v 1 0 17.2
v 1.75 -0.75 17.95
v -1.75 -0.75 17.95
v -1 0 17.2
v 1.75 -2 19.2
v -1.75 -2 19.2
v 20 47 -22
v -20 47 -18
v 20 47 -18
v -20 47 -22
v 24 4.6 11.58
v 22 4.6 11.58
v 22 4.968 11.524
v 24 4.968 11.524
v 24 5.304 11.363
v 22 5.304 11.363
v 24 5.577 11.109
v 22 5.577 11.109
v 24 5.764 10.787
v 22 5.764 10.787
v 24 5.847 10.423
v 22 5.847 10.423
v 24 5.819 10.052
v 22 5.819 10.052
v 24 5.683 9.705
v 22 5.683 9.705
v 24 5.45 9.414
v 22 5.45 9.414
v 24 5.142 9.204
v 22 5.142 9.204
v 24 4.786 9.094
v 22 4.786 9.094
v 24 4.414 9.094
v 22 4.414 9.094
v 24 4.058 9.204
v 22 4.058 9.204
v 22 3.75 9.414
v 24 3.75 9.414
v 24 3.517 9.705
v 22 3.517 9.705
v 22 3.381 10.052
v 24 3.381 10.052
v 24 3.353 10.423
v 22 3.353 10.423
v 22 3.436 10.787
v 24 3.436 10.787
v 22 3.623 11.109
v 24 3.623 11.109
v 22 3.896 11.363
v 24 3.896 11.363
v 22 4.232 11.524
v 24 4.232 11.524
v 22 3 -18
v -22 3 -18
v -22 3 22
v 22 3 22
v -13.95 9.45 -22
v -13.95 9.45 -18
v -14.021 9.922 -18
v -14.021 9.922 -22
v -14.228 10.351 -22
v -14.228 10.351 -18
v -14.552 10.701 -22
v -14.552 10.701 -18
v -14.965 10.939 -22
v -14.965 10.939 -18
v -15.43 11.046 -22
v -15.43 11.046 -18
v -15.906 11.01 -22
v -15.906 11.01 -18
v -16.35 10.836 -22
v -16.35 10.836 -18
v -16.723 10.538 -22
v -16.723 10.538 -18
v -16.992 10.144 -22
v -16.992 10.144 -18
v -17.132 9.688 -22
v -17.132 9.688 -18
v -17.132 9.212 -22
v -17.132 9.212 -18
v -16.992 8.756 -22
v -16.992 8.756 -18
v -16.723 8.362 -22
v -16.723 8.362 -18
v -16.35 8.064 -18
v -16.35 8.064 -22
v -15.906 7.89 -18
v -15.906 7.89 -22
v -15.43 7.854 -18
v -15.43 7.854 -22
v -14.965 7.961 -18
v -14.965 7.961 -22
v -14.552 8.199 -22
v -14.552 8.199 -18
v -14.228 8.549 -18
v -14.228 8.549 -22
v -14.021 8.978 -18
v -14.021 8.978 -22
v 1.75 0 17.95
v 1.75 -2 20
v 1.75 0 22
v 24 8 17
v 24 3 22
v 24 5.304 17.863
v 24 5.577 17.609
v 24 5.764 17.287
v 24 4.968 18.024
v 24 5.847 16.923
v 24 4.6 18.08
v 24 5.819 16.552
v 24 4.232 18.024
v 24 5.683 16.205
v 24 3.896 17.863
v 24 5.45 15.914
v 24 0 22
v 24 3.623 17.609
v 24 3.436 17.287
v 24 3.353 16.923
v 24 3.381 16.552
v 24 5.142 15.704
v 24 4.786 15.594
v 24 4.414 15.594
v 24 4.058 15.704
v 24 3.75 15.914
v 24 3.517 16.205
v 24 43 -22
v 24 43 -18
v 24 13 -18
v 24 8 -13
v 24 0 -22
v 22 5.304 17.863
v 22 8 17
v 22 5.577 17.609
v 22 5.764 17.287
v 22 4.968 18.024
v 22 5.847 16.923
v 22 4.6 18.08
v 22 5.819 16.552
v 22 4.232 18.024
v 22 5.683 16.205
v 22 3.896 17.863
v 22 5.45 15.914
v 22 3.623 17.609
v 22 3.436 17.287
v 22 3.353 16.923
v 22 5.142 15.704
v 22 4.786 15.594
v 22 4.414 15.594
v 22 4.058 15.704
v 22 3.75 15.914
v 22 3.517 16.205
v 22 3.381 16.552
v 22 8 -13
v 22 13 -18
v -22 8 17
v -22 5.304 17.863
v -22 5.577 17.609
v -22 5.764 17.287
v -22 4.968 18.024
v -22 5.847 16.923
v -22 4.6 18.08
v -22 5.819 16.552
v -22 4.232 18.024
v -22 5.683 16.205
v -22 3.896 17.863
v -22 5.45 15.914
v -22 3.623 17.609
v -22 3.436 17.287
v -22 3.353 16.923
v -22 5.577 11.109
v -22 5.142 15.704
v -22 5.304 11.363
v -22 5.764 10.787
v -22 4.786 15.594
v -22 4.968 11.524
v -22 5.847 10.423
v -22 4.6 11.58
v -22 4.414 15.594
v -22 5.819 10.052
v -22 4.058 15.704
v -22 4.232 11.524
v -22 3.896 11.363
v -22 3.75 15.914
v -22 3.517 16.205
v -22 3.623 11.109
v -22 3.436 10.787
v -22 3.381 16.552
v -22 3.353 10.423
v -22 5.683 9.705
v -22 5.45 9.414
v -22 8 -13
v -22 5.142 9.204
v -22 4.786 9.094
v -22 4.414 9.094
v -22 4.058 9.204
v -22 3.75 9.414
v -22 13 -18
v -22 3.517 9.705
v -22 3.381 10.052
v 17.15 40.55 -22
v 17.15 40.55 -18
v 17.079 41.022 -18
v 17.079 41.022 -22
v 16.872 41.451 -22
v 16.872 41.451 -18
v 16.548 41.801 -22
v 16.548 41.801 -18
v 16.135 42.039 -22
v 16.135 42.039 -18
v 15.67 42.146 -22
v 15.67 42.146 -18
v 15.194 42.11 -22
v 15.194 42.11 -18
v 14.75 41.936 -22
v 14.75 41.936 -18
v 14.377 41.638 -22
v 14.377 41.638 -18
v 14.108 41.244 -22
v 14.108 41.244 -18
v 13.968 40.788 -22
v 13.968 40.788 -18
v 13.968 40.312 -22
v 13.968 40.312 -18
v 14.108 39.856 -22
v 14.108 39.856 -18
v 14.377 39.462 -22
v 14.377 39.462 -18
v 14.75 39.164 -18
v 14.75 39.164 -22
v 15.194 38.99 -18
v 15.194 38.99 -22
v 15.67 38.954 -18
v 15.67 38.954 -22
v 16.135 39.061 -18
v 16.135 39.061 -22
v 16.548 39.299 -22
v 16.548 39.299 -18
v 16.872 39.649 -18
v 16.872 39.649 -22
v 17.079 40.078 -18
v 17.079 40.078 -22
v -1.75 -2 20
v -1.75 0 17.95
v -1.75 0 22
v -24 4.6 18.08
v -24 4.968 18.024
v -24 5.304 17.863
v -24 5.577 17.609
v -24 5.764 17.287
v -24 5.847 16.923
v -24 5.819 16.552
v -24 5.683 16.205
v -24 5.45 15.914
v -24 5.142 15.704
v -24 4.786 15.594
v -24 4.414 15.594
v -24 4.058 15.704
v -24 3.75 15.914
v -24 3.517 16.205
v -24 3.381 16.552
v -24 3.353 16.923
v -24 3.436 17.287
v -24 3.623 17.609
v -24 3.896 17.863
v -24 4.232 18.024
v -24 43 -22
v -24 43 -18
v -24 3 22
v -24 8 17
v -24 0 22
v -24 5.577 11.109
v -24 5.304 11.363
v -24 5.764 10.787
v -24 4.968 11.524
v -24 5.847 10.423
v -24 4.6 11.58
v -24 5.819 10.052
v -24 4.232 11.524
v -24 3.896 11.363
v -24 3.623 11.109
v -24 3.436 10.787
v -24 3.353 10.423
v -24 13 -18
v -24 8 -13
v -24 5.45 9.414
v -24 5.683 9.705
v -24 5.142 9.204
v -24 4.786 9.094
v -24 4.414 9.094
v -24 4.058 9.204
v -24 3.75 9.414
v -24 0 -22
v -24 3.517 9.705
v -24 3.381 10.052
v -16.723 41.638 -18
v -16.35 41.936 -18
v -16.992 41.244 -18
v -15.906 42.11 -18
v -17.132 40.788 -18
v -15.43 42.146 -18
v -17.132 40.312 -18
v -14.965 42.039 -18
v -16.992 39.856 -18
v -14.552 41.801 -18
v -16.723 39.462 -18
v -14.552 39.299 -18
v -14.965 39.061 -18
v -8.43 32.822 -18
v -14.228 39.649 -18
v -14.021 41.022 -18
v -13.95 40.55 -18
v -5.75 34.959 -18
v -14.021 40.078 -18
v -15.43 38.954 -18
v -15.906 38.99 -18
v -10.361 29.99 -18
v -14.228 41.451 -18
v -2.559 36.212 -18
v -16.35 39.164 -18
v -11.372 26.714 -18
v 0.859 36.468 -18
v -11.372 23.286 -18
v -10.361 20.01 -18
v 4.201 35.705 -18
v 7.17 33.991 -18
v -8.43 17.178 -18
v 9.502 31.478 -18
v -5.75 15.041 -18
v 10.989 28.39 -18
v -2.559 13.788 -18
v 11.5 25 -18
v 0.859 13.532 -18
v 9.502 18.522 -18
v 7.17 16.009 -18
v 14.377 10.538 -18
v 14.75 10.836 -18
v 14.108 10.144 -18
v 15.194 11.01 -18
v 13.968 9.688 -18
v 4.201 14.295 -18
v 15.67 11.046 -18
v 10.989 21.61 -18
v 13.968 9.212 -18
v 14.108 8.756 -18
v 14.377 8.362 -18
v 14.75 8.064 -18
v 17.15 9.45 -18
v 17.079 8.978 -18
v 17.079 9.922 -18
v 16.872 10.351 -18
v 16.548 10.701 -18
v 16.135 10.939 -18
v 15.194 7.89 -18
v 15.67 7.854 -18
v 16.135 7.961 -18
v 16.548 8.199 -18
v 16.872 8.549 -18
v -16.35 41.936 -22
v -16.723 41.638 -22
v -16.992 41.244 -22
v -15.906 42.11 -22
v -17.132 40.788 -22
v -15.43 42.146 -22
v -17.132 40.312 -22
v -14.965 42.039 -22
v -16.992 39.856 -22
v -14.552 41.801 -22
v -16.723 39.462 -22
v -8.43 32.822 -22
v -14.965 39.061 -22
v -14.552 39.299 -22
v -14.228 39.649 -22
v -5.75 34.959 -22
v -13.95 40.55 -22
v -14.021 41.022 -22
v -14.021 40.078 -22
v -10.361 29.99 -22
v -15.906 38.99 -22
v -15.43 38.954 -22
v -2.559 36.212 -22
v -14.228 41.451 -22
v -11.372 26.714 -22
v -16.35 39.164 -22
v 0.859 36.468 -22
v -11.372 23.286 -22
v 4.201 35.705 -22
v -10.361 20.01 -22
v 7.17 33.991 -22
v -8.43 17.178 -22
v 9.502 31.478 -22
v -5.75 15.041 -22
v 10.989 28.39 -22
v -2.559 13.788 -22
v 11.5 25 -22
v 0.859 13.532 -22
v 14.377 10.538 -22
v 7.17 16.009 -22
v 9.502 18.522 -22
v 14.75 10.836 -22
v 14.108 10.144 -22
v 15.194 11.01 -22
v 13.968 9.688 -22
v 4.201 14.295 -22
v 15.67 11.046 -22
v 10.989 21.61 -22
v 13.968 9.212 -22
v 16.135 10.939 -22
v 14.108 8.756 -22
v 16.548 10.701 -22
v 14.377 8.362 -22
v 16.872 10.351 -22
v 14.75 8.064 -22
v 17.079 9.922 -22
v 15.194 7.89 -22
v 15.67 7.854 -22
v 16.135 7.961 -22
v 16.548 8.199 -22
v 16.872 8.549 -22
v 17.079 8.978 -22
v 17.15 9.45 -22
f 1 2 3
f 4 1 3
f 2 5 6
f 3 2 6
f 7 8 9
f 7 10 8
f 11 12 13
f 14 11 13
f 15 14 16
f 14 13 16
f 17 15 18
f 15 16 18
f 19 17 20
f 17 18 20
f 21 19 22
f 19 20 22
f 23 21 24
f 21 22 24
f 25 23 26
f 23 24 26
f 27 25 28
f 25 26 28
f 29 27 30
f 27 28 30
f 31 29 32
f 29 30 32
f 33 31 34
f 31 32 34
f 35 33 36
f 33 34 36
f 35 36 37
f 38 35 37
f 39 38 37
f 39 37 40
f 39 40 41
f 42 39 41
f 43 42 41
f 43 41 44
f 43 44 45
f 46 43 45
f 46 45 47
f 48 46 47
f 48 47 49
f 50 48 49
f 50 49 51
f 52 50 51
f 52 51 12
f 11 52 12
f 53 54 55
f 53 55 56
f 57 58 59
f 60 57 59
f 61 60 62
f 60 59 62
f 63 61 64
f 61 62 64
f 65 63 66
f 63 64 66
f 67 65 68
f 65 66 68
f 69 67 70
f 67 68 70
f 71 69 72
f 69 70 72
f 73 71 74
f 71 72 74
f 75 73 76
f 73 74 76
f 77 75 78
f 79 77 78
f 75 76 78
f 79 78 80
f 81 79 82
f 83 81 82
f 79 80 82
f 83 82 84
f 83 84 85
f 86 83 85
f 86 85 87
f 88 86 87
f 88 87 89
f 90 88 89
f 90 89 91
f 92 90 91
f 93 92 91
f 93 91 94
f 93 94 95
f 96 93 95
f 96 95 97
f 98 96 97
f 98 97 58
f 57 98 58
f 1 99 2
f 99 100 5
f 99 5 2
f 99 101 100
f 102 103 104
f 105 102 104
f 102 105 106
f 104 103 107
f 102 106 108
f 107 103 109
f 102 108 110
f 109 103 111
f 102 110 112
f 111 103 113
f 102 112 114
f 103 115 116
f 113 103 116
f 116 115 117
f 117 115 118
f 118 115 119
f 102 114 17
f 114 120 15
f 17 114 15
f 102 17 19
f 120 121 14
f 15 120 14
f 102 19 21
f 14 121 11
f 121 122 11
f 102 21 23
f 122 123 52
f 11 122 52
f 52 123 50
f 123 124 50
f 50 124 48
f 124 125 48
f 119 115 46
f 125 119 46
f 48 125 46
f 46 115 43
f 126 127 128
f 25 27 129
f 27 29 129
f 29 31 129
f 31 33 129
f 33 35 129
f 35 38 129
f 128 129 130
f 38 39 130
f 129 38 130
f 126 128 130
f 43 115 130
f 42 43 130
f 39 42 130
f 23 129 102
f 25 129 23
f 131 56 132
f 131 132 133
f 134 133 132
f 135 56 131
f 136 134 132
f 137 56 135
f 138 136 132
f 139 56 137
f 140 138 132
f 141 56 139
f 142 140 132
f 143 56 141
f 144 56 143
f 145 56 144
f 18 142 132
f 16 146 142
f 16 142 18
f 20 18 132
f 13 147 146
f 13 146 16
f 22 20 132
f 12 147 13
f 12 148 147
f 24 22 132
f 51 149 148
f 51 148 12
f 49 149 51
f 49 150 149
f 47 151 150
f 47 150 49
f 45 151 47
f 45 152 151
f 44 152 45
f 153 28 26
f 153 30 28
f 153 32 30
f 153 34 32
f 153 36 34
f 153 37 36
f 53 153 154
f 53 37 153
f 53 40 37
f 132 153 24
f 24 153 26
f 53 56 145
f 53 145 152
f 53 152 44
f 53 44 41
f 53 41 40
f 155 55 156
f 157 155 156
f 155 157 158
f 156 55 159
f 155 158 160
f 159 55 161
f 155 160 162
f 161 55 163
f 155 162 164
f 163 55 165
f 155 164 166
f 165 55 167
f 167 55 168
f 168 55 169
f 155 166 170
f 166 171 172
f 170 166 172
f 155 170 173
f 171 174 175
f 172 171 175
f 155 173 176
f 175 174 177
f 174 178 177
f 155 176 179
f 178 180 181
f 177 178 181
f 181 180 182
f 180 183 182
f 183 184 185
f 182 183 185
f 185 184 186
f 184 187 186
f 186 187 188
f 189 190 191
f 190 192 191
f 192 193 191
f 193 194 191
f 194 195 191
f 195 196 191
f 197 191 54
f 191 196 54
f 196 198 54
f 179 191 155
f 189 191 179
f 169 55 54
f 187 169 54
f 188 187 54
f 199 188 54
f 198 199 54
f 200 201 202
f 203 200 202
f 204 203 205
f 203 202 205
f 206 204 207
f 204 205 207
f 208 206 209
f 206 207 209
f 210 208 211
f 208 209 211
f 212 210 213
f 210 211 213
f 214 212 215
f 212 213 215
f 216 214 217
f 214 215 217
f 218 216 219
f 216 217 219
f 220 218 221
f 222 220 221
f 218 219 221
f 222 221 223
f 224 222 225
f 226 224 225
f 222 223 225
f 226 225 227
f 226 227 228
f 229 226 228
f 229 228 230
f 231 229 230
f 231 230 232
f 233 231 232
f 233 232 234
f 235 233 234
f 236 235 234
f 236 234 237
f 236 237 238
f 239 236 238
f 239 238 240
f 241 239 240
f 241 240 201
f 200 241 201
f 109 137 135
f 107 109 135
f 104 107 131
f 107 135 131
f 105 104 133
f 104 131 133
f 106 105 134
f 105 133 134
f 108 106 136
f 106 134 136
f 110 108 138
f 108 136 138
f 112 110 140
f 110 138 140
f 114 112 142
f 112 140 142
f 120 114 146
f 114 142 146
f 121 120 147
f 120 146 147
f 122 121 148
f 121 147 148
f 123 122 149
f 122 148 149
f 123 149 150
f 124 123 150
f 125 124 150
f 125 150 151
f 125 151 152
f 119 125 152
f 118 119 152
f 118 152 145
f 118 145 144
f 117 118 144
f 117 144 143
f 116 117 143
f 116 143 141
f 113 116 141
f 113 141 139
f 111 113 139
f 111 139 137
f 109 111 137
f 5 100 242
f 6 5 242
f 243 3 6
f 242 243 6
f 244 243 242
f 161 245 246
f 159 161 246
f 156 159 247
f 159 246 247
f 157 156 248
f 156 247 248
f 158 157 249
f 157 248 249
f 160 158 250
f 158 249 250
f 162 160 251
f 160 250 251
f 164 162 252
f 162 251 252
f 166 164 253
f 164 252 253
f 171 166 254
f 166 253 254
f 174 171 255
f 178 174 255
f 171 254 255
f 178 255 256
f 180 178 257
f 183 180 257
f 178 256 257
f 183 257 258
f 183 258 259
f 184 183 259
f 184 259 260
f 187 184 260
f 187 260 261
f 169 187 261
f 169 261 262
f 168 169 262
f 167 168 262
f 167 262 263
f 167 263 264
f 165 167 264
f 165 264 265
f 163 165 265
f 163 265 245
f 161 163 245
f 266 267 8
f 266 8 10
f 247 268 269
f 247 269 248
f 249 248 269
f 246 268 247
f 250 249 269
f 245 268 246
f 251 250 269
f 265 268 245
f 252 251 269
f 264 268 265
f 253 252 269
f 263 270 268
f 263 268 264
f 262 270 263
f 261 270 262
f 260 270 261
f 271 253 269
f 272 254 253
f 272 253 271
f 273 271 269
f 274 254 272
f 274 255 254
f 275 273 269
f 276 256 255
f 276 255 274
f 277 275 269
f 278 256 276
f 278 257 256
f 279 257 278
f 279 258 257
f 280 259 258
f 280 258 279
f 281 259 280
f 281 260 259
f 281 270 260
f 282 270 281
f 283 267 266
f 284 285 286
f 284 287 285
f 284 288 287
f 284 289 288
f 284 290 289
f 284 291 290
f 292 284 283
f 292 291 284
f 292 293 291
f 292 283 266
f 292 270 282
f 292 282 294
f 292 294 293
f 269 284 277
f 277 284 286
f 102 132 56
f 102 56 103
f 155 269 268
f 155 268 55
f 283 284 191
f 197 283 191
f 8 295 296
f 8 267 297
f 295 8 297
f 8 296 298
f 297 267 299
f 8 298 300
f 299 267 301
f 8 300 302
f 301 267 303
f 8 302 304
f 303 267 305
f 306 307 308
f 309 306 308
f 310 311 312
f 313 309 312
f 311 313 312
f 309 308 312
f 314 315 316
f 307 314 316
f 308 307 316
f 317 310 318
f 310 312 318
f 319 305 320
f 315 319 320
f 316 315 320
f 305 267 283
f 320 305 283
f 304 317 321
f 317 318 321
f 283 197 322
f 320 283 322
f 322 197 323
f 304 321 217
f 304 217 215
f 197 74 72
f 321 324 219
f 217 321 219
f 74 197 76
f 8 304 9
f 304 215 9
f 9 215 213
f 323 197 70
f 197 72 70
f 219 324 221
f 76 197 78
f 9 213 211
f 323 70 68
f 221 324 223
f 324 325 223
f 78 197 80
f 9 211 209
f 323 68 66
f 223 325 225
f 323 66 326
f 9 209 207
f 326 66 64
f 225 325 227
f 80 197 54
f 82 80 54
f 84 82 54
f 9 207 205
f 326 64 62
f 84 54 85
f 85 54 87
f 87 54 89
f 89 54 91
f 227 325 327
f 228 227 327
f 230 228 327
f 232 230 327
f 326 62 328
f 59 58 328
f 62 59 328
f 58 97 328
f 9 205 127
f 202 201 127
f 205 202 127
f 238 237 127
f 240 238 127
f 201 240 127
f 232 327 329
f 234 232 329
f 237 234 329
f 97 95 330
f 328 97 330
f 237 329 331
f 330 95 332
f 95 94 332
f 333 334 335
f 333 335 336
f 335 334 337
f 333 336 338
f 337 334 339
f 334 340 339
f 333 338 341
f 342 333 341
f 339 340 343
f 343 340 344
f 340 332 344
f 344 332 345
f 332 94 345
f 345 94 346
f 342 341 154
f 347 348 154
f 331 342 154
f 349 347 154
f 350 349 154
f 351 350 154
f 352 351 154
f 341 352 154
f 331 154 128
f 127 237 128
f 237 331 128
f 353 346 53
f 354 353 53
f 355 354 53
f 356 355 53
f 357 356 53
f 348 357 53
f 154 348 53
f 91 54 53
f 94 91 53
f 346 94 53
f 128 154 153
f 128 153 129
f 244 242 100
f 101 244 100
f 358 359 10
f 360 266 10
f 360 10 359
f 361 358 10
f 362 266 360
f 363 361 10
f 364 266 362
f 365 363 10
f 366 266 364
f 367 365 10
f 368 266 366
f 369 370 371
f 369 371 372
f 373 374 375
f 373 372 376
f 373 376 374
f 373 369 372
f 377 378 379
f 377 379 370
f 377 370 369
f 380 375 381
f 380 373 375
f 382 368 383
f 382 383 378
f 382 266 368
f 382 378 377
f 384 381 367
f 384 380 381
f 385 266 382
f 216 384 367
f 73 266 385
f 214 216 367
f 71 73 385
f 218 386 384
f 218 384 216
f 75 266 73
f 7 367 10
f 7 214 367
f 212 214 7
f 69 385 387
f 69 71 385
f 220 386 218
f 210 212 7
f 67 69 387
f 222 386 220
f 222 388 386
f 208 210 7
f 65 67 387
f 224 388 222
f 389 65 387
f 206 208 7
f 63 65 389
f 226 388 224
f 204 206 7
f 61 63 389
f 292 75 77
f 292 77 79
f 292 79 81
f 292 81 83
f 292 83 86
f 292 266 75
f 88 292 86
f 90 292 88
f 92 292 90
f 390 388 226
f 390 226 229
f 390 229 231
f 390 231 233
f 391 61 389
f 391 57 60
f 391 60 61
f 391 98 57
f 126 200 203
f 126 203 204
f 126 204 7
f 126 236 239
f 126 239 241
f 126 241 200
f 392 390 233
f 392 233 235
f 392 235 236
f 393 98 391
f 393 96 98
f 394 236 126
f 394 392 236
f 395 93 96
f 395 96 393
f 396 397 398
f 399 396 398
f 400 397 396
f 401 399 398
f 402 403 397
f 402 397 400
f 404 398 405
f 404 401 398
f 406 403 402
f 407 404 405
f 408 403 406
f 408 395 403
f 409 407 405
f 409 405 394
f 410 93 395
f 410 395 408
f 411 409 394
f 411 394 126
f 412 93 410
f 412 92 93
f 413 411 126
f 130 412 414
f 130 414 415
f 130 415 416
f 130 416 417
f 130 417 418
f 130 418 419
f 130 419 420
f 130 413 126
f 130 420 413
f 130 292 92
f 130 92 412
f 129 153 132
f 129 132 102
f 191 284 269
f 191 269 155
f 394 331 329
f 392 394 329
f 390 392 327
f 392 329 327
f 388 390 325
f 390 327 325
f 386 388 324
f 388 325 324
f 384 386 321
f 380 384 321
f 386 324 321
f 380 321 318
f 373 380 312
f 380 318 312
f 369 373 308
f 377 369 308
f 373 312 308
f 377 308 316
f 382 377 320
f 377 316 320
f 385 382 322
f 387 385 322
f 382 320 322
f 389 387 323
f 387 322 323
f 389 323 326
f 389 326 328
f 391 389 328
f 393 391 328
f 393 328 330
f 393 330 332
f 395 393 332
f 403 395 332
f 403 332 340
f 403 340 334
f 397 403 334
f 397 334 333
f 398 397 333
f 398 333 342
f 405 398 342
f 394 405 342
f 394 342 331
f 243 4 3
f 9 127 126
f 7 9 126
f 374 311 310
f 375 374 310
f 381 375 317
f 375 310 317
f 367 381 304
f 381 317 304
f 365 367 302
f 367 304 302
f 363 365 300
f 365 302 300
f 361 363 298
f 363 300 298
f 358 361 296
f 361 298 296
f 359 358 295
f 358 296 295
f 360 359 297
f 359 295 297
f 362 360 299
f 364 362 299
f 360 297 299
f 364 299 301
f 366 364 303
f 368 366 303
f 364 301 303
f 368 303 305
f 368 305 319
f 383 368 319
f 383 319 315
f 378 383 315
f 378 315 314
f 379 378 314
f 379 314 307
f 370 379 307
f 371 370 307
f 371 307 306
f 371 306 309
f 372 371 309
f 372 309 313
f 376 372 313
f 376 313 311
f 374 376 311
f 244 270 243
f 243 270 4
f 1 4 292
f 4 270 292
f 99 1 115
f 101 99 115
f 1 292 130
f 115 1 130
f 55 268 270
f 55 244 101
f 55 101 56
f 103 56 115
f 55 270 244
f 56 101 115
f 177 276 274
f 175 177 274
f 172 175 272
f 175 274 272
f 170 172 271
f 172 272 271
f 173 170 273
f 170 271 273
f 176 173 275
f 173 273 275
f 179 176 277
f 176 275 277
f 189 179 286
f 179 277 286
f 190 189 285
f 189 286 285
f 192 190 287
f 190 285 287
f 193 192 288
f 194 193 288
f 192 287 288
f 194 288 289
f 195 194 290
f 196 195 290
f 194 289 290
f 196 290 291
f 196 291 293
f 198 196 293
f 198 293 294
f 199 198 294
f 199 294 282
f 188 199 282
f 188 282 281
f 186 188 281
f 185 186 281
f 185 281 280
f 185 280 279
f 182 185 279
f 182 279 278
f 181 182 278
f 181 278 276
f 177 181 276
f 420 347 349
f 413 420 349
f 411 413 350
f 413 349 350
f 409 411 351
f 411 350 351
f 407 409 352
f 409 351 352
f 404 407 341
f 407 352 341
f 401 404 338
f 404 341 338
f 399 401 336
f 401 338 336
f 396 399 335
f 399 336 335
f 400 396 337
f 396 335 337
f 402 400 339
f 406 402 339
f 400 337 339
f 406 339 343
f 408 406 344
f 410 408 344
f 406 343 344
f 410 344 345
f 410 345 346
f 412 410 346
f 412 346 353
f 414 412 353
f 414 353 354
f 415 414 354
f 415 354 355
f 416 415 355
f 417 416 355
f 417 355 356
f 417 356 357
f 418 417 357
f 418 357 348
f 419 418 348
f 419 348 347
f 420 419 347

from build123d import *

# Parameters (mm, degrees)
SKIZZE1_W                       = 48
SKIZZE1_H                       = 44
AUFSATZ_LINEAR_AUSTRAGEN1_DEPTH = 3
SKIZZE2_W                       = 48
SKIZZE2_H                       = 4
AUFSATZ_LINEAR_AUSTRAGEN2_DEPTH = 44
SKIZZE3_R                       = 11.5
SKIZZE3_R_2                     = 1.6
SCHNITT_LINEAR_AUSTRAGEN1_DEPTH = 67.219332525
SKIZZE5_W                       = 2
SKIZZE5_H                       = 40
AUFSATZ_LINEAR_AUSTRAGEN3_DEPTH = 5
FASE2_SIZE                      = 5
FASE3_SIZE                      = 4
AUFSATZ_LINEAR_AUSTRAGEN4_DEPTH = 2
FASE4_SIZE                      = 2
SKIZZE8_R                       = 1.25
SCHNITT_LINEAR_AUSTRAGEN2_DEPTH = 71.689461732


with BuildPart() as part:
    # Skizze1 → Aufsatz-Linear austragen1 (new body)
    with BuildSketch(Plane(origin=(0, 0, 0), x_dir=(1, 0, 0), z_dir=(0, 1, 0))):
        Rectangle(SKIZZE1_W, SKIZZE1_H)
    extrude(amount=AUFSATZ_LINEAR_AUSTRAGEN1_DEPTH)

    # Skizze2 → Aufsatz-Linear austragen2 (add)
    with BuildSketch(Plane(origin=(0, 3, 0), x_dir=(1, 0, 0), z_dir=(0, 1, 0))):
        with Locations((0, 20)):
            Rectangle(SKIZZE2_W, SKIZZE2_H)
    extrude(amount=AUFSATZ_LINEAR_AUSTRAGEN2_DEPTH)

    # Skizze3 → Schnitt-Linear austragen1 (cut, through all)
    with BuildSketch(Plane.XY.offset(-18)):
        with Locations((0, 25)):
            Circle(SKIZZE3_R)
        with Locations((-15.55, 40.55)):
            Circle(SKIZZE3_R_2)
        with Locations((15.55, 40.55)):
            Circle(SKIZZE3_R_2)
        with Locations((15.55, 9.45)):
            Circle(SKIZZE3_R_2)
        with Locations((-15.55, 9.45)):
            Circle(SKIZZE3_R_2)
    extrude(amount=-SCHNITT_LINEAR_AUSTRAGEN1_DEPTH, mode=Mode.SUBTRACT)

    # Skizze5 → Aufsatz-Linear austragen3 (add)
    with BuildSketch(Plane(origin=(0, 3, 0), x_dir=(1, 0, 0), z_dir=(0, 1, 0))):
        with Locations((-23, -2)):
            Rectangle(SKIZZE5_W, SKIZZE5_H)
        with Locations((23, -2)):
            Rectangle(SKIZZE5_W, SKIZZE5_H)
    extrude(amount=AUFSATZ_LINEAR_AUSTRAGEN3_DEPTH)

    # Fase2
    fase2_edges = [part.edges().sort_by_distance(p)[0] for p in [
        (23, 8, -18),
        (-23, 8, 22),
        (-23, 8, -18),
        (23, 8, 22),
    ]]
    chamfer(fase2_edges, length=FASE2_SIZE)

    # Fase3
    fase3_edges = [part.edges().sort_by_distance(p)[0] for p in [
        (-24, 47, -20),
        (24, 47, -20),
    ]]
    chamfer(fase3_edges, length=FASE3_SIZE)

    # Skizze7 → Aufsatz-Linear austragen4 (add)
    with BuildSketch(Plane.XZ):
        Polygon((-1.75, 22), (1.75, 22), (1.75, 17.95), (1, 17.2), (-1, 17.2), (-1.75, 17.95), align=None)
    extrude(amount=AUFSATZ_LINEAR_AUSTRAGEN4_DEPTH)

    # Fase4
    fase4_edges = [part.edges().sort_by_distance(p)[0] for p in [
        (0, -2, 17.2),
        (0, -2, 22),
    ]]
    chamfer(fase4_edges, length=FASE4_SIZE - 0.0001)  # a hair under: the kernel refuses the full size

    # Skizze8 → Schnitt-Linear austragen2 (cut, through all)
    with BuildSketch(Plane.ZY.offset(24)):
        with Locations((16.83, 4.6)):
            Circle(SKIZZE8_R)
        with Locations((10.33, 4.6)):
            Circle(SKIZZE8_R)
    extrude(amount=-SCHNITT_LINEAR_AUSTRAGEN2_DEPTH, mode=Mode.SUBTRACT)


solid = part.part
